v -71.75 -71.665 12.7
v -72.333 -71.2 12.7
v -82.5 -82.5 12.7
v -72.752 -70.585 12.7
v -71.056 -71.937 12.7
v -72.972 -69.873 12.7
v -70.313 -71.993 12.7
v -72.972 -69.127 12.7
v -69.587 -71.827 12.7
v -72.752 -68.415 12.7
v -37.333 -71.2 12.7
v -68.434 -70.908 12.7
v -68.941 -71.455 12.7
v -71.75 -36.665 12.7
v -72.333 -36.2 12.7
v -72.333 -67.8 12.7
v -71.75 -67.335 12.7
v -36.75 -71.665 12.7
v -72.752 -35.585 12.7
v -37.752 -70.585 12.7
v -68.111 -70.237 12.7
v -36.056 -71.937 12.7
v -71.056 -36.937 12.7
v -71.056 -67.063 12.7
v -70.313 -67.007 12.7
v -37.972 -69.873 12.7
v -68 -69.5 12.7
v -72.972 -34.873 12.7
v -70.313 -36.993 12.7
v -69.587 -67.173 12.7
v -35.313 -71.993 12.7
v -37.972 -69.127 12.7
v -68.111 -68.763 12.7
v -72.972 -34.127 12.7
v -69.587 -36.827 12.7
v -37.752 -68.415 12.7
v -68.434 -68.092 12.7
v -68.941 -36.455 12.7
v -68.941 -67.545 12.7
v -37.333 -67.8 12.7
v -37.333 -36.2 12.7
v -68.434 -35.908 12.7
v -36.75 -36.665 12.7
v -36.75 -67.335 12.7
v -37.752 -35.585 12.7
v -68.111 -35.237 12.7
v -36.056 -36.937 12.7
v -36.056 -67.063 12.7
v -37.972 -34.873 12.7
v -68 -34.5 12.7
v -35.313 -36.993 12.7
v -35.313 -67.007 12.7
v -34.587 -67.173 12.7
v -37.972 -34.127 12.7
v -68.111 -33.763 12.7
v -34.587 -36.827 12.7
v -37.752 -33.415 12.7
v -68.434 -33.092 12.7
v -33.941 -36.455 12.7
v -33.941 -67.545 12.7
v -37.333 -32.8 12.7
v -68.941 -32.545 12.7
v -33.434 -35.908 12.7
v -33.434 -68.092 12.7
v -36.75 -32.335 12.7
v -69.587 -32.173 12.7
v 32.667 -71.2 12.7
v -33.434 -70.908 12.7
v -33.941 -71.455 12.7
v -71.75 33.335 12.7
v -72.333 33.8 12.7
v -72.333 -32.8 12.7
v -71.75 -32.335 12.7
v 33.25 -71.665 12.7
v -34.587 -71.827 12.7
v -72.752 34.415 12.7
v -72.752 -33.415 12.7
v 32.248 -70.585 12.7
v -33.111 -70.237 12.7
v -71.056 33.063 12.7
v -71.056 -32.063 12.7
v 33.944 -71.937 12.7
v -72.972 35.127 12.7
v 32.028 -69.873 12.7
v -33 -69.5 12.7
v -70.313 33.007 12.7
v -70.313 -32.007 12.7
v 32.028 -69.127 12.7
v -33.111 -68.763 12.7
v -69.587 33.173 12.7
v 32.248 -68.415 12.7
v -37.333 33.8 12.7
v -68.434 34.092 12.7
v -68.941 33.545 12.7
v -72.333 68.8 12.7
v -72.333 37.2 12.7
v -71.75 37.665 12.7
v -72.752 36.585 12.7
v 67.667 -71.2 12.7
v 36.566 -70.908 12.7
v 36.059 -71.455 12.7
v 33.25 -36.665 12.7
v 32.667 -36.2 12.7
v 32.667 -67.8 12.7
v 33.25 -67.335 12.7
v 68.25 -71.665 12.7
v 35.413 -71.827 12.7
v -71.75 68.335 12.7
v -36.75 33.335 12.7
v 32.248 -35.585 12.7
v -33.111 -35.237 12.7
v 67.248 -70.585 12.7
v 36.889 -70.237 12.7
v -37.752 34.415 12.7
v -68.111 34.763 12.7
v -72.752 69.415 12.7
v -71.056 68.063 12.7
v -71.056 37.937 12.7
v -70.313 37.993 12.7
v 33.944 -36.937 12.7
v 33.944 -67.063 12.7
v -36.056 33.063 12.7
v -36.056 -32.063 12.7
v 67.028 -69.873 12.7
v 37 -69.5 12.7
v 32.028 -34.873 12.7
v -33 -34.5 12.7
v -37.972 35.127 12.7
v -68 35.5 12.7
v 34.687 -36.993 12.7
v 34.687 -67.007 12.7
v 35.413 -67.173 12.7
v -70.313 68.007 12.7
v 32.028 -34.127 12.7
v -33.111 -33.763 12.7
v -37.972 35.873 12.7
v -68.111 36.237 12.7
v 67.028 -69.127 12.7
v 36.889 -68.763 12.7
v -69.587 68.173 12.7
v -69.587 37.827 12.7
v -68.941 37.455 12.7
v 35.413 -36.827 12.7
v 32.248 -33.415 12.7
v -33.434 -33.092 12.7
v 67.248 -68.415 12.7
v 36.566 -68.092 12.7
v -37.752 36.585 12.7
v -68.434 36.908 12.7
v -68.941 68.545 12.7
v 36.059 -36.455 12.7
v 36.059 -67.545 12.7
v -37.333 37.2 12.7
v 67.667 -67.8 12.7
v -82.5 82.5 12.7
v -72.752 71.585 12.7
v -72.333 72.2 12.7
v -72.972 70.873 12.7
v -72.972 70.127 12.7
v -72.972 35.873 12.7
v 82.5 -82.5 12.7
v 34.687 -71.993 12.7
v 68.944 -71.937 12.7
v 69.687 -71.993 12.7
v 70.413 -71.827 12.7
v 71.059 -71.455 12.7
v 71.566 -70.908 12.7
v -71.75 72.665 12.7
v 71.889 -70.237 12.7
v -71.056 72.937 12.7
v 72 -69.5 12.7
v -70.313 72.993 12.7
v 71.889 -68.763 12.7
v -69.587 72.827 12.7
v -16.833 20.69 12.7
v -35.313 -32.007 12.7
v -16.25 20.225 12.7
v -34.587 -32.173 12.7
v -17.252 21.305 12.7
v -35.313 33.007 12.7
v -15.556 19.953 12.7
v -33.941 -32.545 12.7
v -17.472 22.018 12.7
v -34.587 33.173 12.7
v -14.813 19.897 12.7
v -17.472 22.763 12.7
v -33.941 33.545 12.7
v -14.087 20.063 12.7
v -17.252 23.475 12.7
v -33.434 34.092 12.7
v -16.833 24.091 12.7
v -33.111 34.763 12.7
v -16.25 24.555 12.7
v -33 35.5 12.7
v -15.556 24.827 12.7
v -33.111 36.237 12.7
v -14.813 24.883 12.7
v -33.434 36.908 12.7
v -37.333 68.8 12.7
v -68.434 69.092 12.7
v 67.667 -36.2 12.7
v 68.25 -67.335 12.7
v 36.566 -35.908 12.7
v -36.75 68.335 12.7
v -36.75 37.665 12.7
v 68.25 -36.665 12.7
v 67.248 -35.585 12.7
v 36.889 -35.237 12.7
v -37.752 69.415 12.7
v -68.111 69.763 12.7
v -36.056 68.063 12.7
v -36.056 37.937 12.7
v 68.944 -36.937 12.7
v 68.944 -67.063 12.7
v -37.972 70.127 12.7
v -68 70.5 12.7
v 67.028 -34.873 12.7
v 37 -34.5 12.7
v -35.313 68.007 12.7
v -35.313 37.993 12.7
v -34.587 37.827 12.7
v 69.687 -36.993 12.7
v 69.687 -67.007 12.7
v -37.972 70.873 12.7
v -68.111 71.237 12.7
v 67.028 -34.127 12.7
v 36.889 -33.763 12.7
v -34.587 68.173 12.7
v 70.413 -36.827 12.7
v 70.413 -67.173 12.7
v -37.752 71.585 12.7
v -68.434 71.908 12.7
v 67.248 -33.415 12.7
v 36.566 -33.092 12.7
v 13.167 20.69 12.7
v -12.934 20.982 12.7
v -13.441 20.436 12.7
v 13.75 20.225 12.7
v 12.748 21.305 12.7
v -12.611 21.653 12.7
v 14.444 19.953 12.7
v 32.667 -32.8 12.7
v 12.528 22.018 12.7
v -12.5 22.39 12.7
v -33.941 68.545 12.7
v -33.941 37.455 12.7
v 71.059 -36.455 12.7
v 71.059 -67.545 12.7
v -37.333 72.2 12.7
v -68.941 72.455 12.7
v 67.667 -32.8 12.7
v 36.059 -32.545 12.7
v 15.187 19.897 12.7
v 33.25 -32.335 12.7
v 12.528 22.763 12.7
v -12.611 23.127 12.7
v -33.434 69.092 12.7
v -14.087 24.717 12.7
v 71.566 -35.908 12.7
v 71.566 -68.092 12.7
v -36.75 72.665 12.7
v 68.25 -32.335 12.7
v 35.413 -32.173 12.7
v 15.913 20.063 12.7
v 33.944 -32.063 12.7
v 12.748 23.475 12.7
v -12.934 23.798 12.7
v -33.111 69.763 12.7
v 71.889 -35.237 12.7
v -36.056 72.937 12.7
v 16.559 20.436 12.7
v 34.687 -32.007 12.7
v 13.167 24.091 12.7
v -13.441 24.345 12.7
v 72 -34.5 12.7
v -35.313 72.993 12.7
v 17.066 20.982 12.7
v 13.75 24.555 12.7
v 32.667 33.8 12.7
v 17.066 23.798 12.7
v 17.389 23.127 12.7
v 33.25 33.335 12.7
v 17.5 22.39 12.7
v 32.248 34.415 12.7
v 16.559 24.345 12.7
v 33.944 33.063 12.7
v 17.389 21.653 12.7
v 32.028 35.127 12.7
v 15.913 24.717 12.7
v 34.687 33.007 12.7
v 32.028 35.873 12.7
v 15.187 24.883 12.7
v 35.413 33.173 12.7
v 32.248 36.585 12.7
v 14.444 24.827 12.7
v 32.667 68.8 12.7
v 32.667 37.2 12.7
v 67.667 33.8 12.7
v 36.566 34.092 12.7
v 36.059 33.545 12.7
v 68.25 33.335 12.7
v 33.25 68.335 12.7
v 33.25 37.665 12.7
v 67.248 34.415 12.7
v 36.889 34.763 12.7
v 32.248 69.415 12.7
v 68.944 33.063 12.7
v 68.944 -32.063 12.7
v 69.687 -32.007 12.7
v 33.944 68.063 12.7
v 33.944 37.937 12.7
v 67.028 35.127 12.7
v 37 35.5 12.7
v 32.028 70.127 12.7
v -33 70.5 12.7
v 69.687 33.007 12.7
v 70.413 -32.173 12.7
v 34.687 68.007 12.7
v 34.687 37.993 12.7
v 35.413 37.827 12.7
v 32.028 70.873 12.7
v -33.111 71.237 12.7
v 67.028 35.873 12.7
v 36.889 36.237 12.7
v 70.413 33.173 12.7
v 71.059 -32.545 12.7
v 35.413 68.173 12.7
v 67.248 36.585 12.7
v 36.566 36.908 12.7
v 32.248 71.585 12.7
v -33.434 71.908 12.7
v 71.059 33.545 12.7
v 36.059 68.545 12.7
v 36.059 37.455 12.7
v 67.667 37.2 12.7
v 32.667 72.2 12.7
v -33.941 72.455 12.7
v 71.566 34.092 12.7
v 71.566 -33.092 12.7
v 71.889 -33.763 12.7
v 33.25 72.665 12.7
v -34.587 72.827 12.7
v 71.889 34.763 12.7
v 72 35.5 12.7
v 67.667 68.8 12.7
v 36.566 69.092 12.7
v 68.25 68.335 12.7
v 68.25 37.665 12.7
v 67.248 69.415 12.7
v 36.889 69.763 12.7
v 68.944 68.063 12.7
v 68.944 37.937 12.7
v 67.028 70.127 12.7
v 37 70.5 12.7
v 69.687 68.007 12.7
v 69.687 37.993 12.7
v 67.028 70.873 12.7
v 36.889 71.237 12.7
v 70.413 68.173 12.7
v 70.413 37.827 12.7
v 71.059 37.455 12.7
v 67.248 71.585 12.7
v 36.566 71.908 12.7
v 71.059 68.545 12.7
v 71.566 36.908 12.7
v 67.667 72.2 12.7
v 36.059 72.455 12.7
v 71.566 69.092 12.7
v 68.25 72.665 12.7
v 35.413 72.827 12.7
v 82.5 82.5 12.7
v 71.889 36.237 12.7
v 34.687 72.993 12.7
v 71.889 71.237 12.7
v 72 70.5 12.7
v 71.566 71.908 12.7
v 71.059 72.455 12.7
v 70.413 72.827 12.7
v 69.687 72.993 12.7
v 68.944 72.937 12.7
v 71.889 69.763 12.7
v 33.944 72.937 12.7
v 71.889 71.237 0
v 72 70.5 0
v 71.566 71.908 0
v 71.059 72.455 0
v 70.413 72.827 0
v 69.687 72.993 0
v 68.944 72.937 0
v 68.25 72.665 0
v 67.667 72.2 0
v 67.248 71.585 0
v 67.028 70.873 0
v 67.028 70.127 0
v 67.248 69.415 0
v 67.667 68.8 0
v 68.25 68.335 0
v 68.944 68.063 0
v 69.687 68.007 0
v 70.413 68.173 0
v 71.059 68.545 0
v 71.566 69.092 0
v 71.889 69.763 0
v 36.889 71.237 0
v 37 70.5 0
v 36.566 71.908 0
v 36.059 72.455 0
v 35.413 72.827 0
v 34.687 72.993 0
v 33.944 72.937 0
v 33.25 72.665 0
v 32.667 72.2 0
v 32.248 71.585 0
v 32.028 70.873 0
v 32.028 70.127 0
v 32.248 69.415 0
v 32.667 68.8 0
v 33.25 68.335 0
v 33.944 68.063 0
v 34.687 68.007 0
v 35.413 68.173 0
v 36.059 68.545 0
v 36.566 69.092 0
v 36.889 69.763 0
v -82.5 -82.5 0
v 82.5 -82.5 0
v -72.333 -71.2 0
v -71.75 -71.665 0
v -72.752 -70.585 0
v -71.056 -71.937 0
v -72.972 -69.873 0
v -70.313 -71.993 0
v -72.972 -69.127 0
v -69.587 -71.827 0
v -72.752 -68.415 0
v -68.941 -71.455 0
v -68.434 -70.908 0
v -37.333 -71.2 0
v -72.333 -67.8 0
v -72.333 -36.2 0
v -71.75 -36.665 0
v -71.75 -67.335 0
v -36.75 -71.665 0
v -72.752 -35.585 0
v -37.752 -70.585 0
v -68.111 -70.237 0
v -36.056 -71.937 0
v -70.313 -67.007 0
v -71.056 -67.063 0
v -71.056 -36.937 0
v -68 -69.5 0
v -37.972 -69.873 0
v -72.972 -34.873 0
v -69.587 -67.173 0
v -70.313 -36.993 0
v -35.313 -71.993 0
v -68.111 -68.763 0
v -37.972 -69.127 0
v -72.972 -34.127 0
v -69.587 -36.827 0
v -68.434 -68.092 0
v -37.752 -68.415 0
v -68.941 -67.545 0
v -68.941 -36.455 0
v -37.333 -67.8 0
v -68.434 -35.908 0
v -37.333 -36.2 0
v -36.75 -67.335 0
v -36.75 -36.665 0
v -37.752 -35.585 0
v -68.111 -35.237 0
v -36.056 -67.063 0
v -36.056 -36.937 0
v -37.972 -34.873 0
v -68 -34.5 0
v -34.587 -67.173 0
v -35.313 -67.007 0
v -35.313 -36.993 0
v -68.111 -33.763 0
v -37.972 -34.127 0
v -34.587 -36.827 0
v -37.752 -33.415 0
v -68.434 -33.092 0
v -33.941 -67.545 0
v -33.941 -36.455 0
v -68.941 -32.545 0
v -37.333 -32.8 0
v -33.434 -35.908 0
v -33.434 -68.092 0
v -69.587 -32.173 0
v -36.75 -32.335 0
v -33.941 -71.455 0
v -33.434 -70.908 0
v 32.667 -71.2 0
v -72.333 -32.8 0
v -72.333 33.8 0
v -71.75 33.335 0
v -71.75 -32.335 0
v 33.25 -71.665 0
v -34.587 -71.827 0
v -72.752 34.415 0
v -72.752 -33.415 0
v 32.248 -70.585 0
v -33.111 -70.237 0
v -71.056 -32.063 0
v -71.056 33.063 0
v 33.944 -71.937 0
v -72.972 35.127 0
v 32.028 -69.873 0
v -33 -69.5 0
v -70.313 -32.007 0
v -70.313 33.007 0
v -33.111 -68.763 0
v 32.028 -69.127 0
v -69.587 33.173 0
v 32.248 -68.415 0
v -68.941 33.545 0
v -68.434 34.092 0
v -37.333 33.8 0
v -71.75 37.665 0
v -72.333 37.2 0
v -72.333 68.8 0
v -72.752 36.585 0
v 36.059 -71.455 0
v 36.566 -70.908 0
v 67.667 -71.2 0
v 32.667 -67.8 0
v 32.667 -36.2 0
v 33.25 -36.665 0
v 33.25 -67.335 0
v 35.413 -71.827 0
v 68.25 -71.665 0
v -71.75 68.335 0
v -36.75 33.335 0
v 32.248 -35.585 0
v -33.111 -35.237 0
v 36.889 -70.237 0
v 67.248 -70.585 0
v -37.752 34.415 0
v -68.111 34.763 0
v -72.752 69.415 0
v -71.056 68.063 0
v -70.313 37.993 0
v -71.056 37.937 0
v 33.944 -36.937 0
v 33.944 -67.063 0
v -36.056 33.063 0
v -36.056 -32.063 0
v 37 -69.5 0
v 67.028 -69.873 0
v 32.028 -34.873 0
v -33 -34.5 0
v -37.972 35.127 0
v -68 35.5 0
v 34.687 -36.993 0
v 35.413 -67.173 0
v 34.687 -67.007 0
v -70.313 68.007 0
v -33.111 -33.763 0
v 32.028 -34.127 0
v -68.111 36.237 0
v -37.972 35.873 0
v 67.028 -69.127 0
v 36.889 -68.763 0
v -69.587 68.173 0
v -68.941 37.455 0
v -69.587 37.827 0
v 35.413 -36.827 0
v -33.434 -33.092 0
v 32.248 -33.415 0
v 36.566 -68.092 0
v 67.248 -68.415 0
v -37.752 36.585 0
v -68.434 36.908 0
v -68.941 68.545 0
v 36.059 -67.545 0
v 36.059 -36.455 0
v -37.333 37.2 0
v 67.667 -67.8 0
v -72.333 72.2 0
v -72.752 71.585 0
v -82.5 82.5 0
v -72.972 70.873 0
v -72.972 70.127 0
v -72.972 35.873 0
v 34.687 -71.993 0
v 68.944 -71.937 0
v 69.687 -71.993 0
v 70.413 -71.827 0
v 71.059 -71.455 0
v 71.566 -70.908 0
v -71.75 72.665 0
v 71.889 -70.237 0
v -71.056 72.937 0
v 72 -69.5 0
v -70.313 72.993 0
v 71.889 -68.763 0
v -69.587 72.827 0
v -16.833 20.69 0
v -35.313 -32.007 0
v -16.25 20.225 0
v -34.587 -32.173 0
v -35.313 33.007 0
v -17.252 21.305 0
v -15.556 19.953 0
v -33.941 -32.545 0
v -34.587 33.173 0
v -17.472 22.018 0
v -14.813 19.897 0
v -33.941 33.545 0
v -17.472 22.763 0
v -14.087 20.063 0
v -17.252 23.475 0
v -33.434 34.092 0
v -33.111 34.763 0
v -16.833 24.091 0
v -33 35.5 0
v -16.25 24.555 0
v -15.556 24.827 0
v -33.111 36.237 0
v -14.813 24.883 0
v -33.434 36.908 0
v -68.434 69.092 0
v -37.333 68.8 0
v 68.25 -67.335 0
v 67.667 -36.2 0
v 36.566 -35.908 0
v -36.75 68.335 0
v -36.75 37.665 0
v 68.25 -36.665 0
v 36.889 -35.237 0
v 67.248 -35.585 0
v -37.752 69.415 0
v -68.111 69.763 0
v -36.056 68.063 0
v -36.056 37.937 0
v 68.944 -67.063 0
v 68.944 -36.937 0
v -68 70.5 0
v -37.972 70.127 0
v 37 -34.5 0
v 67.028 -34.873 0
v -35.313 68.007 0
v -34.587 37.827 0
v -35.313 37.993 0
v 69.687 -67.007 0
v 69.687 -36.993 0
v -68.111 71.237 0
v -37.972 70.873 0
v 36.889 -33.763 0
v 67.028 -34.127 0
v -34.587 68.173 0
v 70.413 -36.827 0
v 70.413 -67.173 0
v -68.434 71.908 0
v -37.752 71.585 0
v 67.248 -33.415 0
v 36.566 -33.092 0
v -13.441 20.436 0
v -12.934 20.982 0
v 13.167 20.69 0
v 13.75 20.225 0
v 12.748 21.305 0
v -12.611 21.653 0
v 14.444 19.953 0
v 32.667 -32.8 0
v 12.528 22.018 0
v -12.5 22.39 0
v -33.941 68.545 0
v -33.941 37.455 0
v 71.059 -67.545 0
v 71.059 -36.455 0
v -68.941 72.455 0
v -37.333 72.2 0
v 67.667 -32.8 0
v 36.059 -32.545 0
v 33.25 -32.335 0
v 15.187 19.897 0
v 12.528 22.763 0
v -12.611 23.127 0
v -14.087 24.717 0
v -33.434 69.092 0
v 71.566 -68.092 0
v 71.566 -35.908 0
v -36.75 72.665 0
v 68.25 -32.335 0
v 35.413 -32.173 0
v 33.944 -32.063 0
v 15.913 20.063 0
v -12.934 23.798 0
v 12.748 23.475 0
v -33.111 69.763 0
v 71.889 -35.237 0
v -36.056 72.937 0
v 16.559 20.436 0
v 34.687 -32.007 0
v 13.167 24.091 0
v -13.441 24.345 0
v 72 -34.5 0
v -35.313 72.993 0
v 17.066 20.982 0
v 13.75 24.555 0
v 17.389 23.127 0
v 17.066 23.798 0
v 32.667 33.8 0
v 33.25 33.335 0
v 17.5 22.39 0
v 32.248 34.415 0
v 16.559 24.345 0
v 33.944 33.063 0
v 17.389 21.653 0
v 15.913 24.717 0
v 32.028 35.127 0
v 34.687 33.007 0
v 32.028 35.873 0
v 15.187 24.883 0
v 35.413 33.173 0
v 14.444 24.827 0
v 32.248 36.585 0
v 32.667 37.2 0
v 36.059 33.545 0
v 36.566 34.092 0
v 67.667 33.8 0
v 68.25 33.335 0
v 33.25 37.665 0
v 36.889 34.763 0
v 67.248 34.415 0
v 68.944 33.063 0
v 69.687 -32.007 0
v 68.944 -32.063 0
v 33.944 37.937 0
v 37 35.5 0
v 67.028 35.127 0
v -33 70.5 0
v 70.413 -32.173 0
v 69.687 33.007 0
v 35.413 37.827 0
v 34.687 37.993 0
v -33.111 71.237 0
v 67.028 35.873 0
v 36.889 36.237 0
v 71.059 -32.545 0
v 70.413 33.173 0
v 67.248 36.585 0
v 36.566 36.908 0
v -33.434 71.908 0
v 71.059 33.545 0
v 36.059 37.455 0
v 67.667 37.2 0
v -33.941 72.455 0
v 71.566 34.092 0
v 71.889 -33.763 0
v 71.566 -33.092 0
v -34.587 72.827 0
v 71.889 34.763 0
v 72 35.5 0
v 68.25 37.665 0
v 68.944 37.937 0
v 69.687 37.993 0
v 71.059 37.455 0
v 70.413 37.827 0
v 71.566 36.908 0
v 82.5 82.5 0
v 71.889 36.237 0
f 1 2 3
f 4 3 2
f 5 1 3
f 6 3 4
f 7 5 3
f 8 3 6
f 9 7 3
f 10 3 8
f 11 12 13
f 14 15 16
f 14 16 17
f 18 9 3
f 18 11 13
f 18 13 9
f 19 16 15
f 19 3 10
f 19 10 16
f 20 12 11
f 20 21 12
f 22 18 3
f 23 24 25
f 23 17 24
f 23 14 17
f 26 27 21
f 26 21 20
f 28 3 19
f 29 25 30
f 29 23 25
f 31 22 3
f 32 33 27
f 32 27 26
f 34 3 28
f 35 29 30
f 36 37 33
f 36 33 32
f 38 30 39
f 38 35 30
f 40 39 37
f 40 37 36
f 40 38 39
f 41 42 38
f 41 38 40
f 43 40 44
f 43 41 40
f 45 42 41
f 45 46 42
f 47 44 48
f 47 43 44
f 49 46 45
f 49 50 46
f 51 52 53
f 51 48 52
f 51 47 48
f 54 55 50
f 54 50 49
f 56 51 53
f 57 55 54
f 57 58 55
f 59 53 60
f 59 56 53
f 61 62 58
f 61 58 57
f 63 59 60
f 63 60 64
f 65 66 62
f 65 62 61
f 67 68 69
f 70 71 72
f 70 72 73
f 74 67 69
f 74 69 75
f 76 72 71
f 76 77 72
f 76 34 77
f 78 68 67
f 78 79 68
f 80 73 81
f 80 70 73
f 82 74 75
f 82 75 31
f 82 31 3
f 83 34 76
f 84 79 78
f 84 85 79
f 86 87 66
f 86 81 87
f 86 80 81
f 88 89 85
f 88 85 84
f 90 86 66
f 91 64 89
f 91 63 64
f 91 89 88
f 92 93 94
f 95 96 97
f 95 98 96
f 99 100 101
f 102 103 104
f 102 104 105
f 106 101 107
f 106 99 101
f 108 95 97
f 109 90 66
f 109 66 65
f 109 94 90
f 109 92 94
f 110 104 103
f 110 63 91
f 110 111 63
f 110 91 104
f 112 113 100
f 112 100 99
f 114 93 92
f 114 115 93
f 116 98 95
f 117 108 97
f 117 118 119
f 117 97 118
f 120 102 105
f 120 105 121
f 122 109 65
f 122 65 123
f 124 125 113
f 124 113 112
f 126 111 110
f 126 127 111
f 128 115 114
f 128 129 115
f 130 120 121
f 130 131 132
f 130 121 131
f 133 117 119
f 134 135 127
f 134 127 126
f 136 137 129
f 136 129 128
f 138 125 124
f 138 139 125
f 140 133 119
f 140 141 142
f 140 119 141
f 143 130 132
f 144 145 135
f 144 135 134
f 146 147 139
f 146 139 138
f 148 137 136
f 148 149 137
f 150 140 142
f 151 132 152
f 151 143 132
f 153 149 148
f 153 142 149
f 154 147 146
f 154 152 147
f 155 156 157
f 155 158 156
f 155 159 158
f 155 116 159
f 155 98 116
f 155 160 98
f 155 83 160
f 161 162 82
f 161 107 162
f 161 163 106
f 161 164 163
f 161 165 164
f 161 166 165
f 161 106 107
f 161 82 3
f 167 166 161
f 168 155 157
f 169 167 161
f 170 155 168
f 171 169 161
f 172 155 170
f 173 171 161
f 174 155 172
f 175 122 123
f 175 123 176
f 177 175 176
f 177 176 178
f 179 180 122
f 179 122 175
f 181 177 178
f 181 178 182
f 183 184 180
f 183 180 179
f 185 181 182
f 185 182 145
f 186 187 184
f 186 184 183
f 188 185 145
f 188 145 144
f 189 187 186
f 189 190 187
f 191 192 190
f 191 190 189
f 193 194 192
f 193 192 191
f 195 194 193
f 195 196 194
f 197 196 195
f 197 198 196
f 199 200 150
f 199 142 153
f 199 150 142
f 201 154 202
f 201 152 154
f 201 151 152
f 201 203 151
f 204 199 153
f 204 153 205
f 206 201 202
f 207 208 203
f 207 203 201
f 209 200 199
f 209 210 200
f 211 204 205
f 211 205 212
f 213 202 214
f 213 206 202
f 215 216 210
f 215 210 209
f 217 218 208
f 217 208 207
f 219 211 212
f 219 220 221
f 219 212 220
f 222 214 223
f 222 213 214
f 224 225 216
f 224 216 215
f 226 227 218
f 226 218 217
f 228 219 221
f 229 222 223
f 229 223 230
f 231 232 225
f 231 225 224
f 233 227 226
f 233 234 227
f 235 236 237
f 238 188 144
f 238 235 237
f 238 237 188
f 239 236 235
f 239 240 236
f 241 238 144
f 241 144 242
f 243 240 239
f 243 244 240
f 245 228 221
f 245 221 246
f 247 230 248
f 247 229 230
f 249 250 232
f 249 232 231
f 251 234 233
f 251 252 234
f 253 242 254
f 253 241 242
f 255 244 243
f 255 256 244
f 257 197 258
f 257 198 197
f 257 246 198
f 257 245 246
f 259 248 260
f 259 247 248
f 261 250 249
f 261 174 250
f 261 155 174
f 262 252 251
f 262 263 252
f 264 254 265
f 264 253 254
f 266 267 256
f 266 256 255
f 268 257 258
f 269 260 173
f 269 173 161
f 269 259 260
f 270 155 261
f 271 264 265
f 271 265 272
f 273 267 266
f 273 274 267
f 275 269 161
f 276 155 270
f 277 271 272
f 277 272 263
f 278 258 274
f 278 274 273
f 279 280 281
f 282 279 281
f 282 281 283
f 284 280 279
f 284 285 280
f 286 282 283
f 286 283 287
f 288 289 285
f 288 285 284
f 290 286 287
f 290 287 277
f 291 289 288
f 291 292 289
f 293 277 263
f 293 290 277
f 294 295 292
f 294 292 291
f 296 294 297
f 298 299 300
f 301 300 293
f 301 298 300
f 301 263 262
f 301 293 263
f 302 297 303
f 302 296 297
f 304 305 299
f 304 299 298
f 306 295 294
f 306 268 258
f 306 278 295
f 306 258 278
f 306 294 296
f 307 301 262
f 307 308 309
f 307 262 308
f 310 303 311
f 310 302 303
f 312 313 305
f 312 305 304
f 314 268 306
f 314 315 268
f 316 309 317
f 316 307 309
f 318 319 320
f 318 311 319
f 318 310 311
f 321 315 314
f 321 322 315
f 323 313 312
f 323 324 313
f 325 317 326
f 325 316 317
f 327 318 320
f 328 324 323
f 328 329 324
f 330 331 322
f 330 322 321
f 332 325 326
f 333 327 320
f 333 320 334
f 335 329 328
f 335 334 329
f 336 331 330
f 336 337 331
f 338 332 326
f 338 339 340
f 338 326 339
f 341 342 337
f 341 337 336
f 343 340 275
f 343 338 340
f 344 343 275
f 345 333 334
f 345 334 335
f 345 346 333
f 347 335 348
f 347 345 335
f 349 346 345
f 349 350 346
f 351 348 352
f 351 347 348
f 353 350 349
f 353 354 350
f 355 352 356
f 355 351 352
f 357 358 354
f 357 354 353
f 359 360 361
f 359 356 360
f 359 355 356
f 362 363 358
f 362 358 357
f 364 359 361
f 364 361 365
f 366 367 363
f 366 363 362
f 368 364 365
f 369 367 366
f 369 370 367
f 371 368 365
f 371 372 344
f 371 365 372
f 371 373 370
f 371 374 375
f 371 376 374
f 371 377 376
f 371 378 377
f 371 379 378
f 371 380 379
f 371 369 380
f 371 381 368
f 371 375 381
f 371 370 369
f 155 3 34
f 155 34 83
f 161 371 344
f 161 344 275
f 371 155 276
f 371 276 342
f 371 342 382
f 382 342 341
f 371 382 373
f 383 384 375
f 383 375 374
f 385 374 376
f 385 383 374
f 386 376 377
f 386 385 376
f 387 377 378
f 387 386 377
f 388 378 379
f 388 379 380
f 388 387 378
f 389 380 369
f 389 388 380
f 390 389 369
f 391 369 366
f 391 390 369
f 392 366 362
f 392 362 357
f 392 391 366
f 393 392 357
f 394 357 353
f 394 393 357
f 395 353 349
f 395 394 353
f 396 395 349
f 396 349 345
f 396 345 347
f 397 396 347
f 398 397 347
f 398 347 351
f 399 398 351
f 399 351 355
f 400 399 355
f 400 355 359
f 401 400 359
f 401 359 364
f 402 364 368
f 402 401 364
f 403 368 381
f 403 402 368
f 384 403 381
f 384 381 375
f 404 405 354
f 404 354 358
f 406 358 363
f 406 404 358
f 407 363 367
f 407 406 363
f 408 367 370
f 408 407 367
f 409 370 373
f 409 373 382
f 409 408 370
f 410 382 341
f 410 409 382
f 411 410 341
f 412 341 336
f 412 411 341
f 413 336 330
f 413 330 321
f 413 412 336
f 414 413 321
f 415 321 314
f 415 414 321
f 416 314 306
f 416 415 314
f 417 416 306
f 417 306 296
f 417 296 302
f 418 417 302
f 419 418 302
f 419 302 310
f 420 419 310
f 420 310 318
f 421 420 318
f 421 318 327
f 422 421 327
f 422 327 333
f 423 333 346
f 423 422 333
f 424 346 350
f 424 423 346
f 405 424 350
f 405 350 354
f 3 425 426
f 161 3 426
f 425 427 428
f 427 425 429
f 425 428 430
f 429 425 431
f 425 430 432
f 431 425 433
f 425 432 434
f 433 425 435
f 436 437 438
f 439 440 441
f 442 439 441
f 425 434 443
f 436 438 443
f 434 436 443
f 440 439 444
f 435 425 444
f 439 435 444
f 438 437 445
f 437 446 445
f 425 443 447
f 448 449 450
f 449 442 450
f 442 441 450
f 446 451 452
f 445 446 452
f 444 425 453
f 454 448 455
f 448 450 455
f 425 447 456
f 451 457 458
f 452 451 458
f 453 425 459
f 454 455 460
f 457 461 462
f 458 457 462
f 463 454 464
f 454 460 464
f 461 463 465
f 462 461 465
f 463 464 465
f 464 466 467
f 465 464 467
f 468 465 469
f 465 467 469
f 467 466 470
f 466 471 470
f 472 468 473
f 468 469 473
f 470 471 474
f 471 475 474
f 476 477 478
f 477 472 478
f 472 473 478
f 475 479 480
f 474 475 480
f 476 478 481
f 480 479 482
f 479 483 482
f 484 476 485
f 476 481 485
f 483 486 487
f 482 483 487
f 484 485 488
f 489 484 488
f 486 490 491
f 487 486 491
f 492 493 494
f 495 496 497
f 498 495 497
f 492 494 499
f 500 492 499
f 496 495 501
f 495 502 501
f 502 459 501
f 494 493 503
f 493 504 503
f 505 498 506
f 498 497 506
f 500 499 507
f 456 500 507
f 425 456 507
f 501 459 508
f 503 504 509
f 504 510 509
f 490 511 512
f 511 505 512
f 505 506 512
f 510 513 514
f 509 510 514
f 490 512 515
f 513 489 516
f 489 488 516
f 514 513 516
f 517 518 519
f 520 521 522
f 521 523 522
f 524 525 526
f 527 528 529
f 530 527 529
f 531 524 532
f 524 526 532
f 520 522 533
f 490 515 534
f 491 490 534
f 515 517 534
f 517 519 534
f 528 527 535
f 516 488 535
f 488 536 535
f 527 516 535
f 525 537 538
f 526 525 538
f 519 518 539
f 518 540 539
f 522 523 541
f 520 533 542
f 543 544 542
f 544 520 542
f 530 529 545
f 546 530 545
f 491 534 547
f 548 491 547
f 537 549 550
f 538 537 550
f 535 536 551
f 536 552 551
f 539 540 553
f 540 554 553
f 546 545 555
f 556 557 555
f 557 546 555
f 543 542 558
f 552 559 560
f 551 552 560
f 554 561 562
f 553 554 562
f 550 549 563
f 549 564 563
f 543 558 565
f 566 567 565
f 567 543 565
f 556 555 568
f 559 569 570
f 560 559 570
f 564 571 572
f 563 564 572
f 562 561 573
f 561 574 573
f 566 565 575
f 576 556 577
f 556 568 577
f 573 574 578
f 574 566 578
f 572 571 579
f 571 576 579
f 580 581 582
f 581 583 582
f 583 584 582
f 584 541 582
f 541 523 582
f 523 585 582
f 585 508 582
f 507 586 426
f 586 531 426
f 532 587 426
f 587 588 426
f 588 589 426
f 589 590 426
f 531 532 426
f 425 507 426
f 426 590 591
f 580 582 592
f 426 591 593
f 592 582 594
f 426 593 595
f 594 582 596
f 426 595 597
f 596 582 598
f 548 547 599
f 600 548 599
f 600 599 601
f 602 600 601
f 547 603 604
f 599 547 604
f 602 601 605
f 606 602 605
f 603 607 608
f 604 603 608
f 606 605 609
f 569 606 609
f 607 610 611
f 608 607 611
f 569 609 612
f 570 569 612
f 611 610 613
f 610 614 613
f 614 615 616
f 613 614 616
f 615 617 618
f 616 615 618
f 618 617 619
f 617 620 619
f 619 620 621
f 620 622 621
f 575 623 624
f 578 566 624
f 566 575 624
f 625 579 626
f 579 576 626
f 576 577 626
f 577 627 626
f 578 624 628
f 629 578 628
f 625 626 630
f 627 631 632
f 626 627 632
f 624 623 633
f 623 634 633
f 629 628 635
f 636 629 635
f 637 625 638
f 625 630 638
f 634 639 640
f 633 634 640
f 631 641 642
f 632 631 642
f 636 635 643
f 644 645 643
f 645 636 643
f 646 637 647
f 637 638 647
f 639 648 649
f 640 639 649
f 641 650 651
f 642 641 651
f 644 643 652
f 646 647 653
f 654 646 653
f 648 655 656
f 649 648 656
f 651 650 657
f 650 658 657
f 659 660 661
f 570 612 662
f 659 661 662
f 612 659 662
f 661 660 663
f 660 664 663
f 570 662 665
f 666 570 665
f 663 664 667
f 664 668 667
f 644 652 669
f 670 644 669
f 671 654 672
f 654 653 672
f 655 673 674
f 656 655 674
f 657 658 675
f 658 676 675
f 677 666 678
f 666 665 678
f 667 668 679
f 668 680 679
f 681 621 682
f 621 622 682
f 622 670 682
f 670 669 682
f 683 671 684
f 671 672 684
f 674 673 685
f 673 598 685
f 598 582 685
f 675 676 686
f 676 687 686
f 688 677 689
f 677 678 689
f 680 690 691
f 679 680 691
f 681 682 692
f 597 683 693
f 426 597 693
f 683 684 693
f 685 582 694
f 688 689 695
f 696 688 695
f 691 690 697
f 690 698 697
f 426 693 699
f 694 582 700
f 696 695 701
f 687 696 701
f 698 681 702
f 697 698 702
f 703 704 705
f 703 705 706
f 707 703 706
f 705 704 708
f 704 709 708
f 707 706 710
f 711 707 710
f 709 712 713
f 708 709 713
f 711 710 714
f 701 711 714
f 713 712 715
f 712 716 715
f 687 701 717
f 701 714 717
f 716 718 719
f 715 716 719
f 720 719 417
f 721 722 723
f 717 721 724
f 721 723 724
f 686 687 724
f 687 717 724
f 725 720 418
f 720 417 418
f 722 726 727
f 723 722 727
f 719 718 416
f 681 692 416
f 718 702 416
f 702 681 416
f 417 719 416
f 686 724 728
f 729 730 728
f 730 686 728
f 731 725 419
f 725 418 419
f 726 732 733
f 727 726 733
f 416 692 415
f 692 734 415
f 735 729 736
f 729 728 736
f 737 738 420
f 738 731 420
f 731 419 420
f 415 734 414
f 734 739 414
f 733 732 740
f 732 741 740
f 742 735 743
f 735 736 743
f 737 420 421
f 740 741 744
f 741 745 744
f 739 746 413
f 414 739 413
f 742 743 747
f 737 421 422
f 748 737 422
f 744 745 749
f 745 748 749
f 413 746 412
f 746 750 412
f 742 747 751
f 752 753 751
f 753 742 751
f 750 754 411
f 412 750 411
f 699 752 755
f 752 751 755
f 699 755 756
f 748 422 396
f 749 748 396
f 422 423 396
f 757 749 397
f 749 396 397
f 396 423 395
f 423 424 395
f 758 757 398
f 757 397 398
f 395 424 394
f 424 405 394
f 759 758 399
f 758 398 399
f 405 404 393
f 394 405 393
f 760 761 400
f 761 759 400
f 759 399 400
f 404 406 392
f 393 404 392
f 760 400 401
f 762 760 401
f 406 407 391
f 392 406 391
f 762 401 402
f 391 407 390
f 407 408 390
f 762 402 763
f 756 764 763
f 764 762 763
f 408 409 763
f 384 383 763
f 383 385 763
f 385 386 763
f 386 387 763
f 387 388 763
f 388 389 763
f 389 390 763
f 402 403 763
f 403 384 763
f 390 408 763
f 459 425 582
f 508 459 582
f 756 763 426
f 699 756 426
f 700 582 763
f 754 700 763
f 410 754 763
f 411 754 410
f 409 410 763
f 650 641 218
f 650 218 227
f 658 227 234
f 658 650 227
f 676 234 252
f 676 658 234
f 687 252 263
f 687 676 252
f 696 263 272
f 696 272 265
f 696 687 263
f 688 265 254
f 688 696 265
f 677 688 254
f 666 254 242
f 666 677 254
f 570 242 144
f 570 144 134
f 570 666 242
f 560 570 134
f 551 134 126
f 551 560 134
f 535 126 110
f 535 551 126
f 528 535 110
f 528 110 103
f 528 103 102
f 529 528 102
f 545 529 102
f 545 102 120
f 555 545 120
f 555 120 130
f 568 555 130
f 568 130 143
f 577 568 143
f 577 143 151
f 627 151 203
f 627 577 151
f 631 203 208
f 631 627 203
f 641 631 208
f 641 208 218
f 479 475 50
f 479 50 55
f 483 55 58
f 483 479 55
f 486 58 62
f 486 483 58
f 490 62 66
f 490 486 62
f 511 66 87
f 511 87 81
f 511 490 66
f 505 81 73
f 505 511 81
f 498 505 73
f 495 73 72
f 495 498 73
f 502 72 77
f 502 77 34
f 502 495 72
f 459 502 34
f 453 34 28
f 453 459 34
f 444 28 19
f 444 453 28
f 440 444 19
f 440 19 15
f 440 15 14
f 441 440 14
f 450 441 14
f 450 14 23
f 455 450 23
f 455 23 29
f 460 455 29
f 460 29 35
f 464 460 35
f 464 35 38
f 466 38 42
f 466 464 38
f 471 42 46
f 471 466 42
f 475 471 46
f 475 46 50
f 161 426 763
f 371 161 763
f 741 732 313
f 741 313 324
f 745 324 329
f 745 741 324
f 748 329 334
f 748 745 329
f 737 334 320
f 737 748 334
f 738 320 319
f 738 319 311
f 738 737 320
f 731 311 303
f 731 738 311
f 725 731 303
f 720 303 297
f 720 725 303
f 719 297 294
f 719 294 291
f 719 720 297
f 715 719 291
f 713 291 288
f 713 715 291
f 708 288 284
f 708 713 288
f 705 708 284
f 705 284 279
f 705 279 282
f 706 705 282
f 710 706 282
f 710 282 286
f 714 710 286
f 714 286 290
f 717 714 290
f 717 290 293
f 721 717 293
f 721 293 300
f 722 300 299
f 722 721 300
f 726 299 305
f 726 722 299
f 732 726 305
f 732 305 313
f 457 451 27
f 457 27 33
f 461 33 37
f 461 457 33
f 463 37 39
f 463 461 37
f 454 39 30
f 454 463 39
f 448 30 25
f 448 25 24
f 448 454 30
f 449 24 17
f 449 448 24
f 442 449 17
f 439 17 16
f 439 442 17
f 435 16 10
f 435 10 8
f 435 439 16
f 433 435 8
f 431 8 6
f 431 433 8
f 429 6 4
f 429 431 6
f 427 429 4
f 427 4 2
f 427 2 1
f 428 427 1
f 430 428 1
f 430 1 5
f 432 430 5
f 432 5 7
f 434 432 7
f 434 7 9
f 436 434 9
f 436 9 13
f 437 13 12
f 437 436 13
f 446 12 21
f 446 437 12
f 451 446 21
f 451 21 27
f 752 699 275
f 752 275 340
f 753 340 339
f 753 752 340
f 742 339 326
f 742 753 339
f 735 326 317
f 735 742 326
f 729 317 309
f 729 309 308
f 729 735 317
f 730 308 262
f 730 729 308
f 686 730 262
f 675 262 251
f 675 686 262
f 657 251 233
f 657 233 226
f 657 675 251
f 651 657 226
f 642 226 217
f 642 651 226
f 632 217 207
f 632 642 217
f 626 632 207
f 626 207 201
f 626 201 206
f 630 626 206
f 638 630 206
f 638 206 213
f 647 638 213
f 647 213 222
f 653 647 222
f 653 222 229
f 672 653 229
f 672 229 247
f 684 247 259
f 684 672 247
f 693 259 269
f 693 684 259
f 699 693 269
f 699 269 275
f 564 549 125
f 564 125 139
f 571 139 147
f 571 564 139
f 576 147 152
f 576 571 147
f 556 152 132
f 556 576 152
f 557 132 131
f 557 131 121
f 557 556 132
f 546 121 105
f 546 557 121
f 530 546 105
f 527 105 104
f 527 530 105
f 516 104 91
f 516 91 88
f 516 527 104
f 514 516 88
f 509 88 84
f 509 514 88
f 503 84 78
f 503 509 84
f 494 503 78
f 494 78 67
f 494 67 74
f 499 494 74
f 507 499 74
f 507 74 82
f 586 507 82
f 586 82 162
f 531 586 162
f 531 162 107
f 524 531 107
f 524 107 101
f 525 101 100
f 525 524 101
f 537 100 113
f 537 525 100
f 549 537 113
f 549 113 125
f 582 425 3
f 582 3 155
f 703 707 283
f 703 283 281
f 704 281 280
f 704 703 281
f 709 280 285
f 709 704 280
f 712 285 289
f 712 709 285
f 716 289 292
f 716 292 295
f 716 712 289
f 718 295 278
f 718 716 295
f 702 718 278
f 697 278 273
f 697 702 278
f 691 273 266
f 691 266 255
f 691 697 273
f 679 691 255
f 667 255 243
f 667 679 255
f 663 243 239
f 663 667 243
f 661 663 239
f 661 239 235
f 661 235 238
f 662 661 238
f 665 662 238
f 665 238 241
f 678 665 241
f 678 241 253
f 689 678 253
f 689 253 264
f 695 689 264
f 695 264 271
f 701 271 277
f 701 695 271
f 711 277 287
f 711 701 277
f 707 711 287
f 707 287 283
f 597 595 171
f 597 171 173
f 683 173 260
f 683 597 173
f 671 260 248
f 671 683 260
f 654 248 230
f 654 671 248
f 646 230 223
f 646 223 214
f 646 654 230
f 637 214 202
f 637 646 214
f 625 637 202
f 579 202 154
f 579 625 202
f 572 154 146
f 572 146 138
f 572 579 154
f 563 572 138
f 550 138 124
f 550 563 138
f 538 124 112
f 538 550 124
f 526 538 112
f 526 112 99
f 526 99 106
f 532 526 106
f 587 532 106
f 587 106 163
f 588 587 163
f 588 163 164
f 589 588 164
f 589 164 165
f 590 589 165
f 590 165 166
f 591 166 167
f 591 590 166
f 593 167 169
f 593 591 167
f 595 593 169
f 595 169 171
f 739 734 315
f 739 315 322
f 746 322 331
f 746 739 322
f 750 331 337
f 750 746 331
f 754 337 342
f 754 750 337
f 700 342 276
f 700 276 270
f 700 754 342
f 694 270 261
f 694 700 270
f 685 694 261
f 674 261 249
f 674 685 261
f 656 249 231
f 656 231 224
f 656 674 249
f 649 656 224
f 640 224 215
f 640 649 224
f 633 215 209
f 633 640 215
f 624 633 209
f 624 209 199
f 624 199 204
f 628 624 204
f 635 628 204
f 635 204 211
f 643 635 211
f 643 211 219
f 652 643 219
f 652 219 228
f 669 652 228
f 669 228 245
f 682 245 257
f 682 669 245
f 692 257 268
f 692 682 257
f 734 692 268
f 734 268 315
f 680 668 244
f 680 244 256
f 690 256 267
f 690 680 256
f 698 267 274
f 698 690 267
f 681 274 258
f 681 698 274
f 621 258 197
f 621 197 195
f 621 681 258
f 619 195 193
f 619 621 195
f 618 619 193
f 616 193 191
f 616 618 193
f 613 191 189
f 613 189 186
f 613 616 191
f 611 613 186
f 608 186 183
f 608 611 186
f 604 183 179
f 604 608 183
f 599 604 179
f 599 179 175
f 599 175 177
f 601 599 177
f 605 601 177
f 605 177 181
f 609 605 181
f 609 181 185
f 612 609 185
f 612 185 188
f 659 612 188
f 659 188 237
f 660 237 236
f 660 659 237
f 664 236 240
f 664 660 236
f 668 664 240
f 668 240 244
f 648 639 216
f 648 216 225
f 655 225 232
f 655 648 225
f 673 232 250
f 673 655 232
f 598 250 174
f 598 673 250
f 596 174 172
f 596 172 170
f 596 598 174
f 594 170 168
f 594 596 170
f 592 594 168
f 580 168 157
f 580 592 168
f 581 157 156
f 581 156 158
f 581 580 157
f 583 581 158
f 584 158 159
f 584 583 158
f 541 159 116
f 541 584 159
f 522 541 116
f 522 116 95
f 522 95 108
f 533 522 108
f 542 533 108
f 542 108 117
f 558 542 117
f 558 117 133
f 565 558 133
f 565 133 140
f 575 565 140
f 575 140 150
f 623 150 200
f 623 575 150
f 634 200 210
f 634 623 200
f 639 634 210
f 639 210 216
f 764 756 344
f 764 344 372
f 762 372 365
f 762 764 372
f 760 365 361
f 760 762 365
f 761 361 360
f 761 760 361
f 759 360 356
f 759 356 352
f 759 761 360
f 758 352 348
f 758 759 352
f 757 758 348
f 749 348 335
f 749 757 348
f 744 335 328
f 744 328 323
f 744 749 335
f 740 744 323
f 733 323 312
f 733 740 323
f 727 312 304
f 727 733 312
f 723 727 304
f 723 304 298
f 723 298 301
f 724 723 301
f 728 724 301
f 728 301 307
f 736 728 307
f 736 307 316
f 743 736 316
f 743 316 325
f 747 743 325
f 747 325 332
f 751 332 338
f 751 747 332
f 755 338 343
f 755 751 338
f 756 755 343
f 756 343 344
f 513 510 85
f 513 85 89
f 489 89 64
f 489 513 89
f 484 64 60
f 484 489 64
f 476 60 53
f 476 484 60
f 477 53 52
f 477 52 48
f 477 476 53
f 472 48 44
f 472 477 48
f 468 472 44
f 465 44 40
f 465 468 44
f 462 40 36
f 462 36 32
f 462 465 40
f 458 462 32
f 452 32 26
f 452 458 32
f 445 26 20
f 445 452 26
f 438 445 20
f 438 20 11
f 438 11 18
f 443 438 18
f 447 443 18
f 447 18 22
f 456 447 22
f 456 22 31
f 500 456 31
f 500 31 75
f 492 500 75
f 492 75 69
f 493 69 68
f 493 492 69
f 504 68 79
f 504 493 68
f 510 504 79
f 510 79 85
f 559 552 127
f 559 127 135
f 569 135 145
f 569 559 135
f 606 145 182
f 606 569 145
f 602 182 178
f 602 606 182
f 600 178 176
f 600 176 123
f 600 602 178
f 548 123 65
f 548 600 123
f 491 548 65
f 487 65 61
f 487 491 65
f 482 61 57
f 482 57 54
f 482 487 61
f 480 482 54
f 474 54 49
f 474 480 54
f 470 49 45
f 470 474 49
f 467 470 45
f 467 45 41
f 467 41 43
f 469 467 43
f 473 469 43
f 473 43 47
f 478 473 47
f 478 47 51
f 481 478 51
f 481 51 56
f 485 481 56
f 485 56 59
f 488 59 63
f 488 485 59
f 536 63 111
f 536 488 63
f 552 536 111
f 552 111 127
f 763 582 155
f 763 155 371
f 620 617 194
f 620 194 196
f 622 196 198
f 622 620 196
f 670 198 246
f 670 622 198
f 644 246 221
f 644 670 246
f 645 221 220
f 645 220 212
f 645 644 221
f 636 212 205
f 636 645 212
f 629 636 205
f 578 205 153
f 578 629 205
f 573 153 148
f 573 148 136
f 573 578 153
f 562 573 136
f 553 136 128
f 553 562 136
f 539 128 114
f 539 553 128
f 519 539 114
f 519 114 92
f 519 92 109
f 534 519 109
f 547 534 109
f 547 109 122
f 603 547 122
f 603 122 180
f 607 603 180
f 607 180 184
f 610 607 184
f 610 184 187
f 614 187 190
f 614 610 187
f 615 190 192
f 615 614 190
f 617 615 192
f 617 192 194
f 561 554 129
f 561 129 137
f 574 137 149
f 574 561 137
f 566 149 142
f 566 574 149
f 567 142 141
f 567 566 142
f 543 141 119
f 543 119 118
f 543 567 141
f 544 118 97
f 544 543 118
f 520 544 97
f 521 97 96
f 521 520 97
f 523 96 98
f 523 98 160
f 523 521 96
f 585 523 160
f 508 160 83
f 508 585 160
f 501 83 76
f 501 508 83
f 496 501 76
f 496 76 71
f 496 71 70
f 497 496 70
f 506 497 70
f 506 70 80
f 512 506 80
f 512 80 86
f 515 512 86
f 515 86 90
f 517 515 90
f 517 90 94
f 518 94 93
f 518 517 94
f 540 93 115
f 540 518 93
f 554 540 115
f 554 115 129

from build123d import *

# Parameters (mm, degrees)
CROQUIS1_W              = 165
CROQUIS1_H              = 165
CROQUIS1_R              = 2.5
SALIENTE_EXTRUIR1_DEPTH = 12.7
CORTAR_EXTRUIR1_START   = -12.7
CROQUIS2_R              = 2.5
CORTAR_EXTRUIR1_DEPTH   = 12.7


with BuildPart() as part:
    # Croquis1 → Saliente-Extruir1 (new body)
    with BuildSketch(Plane.XY):
        Rectangle(CROQUIS1_W, CROQUIS1_H)
        with Locations((-70.5, 70.5)):
            Circle(CROQUIS1_R, mode=Mode.SUBTRACT)
        with Locations((-35.5, 70.5)):
            Circle(CROQUIS1_R, mode=Mode.SUBTRACT)
        with Locations((-35.5, 35.5)):
            Circle(CROQUIS1_R, mode=Mode.SUBTRACT)
        with Locations((-70.5, 35.5)):
            Circle(CROQUIS1_R, mode=Mode.SUBTRACT)
        with Locations((34.5, 70.5)):
            Circle(CROQUIS1_R, mode=Mode.SUBTRACT)
        with Locations((69.5, 70.5)):
            Circle(CROQUIS1_R, mode=Mode.SUBTRACT)
        with Locations((69.5, 35.5)):
            Circle(CROQUIS1_R, mode=Mode.SUBTRACT)
        with Locations((34.5, 35.5)):
            Circle(CROQUIS1_R, mode=Mode.SUBTRACT)
        with Locations((34.5, -34.5)):
            Circle(CROQUIS1_R, mode=Mode.SUBTRACT)
        with Locations((69.5, -34.5)):
            Circle(CROQUIS1_R, mode=Mode.SUBTRACT)
        with Locations((69.5, -69.5)):
            Circle(CROQUIS1_R, mode=Mode.SUBTRACT)
        with Locations((34.5, -69.5)):
            Circle(CROQUIS1_R, mode=Mode.SUBTRACT)
        with Locations((-70.5, -34.5)):
            Circle(CROQUIS1_R, mode=Mode.SUBTRACT)
        with Locations((-35.5, -34.5)):
            Circle(CROQUIS1_R, mode=Mode.SUBTRACT)
        with Locations((-35.5, -69.5)):
            Circle(CROQUIS1_R, mode=Mode.SUBTRACT)
        with Locations((-70.5, -69.5)):
            Circle(CROQUIS1_R, mode=Mode.SUBTRACT)
    extrude(amount=SALIENTE_EXTRUIR1_DEPTH)

    # Croquis2 → Cortar-Extruir1 (cut)
    with BuildSketch(Plane.XY.offset(12.7).offset(CORTAR_EXTRUIR1_START)):
        with Locations((-15, 22.390106488)):
            Circle(CROQUIS2_R)
        with Locations((15, 22.390106488)):
            Circle(CROQUIS2_R)
        with Locations((69.5, -69.5)):
            Circle(CROQUIS2_R)
        with Locations((69.5, -34.5)):
            Circle(CROQUIS2_R)
        with Locations((34.5, -69.5)):
            Circle(CROQUIS2_R)
        with Locations((34.5, -34.5)):
            Circle(CROQUIS2_R)
        with Locations((-35.5, -69.5)):
            Circle(CROQUIS2_R)
        with Locations((-70.5, -69.5)):
            Circle(CROQUIS2_R)
        with Locations((-35.5, -34.5)):
            Circle(CROQUIS2_R)
        with Locations((-70.5, -34.5)):
            Circle(CROQUIS2_R)
        with Locations((69.5, 35.5)):
            Circle(CROQUIS2_R)
        with Locations((34.5, 35.5)):
            Circle(CROQUIS2_R)
        with Locations((69.5, 70.5)):
            Circle(CROQUIS2_R)
        with Locations((34.5, 70.5)):
            Circle(CROQUIS2_R)
        with Locations((-35.5, 35.5)):
            Circle(CROQUIS2_R)
        with Locations((-70.5, 35.5)):
            Circle(CROQUIS2_R)
        with Locations((-35.5, 70.5)):
            Circle(CROQUIS2_R)
        with Locations((-70.5, 70.5)):
            Circle(CROQUIS2_R)
    extrude(amount=CORTAR_EXTRUIR1_DEPTH, mode=Mode.SUBTRACT)


solid = part.part
